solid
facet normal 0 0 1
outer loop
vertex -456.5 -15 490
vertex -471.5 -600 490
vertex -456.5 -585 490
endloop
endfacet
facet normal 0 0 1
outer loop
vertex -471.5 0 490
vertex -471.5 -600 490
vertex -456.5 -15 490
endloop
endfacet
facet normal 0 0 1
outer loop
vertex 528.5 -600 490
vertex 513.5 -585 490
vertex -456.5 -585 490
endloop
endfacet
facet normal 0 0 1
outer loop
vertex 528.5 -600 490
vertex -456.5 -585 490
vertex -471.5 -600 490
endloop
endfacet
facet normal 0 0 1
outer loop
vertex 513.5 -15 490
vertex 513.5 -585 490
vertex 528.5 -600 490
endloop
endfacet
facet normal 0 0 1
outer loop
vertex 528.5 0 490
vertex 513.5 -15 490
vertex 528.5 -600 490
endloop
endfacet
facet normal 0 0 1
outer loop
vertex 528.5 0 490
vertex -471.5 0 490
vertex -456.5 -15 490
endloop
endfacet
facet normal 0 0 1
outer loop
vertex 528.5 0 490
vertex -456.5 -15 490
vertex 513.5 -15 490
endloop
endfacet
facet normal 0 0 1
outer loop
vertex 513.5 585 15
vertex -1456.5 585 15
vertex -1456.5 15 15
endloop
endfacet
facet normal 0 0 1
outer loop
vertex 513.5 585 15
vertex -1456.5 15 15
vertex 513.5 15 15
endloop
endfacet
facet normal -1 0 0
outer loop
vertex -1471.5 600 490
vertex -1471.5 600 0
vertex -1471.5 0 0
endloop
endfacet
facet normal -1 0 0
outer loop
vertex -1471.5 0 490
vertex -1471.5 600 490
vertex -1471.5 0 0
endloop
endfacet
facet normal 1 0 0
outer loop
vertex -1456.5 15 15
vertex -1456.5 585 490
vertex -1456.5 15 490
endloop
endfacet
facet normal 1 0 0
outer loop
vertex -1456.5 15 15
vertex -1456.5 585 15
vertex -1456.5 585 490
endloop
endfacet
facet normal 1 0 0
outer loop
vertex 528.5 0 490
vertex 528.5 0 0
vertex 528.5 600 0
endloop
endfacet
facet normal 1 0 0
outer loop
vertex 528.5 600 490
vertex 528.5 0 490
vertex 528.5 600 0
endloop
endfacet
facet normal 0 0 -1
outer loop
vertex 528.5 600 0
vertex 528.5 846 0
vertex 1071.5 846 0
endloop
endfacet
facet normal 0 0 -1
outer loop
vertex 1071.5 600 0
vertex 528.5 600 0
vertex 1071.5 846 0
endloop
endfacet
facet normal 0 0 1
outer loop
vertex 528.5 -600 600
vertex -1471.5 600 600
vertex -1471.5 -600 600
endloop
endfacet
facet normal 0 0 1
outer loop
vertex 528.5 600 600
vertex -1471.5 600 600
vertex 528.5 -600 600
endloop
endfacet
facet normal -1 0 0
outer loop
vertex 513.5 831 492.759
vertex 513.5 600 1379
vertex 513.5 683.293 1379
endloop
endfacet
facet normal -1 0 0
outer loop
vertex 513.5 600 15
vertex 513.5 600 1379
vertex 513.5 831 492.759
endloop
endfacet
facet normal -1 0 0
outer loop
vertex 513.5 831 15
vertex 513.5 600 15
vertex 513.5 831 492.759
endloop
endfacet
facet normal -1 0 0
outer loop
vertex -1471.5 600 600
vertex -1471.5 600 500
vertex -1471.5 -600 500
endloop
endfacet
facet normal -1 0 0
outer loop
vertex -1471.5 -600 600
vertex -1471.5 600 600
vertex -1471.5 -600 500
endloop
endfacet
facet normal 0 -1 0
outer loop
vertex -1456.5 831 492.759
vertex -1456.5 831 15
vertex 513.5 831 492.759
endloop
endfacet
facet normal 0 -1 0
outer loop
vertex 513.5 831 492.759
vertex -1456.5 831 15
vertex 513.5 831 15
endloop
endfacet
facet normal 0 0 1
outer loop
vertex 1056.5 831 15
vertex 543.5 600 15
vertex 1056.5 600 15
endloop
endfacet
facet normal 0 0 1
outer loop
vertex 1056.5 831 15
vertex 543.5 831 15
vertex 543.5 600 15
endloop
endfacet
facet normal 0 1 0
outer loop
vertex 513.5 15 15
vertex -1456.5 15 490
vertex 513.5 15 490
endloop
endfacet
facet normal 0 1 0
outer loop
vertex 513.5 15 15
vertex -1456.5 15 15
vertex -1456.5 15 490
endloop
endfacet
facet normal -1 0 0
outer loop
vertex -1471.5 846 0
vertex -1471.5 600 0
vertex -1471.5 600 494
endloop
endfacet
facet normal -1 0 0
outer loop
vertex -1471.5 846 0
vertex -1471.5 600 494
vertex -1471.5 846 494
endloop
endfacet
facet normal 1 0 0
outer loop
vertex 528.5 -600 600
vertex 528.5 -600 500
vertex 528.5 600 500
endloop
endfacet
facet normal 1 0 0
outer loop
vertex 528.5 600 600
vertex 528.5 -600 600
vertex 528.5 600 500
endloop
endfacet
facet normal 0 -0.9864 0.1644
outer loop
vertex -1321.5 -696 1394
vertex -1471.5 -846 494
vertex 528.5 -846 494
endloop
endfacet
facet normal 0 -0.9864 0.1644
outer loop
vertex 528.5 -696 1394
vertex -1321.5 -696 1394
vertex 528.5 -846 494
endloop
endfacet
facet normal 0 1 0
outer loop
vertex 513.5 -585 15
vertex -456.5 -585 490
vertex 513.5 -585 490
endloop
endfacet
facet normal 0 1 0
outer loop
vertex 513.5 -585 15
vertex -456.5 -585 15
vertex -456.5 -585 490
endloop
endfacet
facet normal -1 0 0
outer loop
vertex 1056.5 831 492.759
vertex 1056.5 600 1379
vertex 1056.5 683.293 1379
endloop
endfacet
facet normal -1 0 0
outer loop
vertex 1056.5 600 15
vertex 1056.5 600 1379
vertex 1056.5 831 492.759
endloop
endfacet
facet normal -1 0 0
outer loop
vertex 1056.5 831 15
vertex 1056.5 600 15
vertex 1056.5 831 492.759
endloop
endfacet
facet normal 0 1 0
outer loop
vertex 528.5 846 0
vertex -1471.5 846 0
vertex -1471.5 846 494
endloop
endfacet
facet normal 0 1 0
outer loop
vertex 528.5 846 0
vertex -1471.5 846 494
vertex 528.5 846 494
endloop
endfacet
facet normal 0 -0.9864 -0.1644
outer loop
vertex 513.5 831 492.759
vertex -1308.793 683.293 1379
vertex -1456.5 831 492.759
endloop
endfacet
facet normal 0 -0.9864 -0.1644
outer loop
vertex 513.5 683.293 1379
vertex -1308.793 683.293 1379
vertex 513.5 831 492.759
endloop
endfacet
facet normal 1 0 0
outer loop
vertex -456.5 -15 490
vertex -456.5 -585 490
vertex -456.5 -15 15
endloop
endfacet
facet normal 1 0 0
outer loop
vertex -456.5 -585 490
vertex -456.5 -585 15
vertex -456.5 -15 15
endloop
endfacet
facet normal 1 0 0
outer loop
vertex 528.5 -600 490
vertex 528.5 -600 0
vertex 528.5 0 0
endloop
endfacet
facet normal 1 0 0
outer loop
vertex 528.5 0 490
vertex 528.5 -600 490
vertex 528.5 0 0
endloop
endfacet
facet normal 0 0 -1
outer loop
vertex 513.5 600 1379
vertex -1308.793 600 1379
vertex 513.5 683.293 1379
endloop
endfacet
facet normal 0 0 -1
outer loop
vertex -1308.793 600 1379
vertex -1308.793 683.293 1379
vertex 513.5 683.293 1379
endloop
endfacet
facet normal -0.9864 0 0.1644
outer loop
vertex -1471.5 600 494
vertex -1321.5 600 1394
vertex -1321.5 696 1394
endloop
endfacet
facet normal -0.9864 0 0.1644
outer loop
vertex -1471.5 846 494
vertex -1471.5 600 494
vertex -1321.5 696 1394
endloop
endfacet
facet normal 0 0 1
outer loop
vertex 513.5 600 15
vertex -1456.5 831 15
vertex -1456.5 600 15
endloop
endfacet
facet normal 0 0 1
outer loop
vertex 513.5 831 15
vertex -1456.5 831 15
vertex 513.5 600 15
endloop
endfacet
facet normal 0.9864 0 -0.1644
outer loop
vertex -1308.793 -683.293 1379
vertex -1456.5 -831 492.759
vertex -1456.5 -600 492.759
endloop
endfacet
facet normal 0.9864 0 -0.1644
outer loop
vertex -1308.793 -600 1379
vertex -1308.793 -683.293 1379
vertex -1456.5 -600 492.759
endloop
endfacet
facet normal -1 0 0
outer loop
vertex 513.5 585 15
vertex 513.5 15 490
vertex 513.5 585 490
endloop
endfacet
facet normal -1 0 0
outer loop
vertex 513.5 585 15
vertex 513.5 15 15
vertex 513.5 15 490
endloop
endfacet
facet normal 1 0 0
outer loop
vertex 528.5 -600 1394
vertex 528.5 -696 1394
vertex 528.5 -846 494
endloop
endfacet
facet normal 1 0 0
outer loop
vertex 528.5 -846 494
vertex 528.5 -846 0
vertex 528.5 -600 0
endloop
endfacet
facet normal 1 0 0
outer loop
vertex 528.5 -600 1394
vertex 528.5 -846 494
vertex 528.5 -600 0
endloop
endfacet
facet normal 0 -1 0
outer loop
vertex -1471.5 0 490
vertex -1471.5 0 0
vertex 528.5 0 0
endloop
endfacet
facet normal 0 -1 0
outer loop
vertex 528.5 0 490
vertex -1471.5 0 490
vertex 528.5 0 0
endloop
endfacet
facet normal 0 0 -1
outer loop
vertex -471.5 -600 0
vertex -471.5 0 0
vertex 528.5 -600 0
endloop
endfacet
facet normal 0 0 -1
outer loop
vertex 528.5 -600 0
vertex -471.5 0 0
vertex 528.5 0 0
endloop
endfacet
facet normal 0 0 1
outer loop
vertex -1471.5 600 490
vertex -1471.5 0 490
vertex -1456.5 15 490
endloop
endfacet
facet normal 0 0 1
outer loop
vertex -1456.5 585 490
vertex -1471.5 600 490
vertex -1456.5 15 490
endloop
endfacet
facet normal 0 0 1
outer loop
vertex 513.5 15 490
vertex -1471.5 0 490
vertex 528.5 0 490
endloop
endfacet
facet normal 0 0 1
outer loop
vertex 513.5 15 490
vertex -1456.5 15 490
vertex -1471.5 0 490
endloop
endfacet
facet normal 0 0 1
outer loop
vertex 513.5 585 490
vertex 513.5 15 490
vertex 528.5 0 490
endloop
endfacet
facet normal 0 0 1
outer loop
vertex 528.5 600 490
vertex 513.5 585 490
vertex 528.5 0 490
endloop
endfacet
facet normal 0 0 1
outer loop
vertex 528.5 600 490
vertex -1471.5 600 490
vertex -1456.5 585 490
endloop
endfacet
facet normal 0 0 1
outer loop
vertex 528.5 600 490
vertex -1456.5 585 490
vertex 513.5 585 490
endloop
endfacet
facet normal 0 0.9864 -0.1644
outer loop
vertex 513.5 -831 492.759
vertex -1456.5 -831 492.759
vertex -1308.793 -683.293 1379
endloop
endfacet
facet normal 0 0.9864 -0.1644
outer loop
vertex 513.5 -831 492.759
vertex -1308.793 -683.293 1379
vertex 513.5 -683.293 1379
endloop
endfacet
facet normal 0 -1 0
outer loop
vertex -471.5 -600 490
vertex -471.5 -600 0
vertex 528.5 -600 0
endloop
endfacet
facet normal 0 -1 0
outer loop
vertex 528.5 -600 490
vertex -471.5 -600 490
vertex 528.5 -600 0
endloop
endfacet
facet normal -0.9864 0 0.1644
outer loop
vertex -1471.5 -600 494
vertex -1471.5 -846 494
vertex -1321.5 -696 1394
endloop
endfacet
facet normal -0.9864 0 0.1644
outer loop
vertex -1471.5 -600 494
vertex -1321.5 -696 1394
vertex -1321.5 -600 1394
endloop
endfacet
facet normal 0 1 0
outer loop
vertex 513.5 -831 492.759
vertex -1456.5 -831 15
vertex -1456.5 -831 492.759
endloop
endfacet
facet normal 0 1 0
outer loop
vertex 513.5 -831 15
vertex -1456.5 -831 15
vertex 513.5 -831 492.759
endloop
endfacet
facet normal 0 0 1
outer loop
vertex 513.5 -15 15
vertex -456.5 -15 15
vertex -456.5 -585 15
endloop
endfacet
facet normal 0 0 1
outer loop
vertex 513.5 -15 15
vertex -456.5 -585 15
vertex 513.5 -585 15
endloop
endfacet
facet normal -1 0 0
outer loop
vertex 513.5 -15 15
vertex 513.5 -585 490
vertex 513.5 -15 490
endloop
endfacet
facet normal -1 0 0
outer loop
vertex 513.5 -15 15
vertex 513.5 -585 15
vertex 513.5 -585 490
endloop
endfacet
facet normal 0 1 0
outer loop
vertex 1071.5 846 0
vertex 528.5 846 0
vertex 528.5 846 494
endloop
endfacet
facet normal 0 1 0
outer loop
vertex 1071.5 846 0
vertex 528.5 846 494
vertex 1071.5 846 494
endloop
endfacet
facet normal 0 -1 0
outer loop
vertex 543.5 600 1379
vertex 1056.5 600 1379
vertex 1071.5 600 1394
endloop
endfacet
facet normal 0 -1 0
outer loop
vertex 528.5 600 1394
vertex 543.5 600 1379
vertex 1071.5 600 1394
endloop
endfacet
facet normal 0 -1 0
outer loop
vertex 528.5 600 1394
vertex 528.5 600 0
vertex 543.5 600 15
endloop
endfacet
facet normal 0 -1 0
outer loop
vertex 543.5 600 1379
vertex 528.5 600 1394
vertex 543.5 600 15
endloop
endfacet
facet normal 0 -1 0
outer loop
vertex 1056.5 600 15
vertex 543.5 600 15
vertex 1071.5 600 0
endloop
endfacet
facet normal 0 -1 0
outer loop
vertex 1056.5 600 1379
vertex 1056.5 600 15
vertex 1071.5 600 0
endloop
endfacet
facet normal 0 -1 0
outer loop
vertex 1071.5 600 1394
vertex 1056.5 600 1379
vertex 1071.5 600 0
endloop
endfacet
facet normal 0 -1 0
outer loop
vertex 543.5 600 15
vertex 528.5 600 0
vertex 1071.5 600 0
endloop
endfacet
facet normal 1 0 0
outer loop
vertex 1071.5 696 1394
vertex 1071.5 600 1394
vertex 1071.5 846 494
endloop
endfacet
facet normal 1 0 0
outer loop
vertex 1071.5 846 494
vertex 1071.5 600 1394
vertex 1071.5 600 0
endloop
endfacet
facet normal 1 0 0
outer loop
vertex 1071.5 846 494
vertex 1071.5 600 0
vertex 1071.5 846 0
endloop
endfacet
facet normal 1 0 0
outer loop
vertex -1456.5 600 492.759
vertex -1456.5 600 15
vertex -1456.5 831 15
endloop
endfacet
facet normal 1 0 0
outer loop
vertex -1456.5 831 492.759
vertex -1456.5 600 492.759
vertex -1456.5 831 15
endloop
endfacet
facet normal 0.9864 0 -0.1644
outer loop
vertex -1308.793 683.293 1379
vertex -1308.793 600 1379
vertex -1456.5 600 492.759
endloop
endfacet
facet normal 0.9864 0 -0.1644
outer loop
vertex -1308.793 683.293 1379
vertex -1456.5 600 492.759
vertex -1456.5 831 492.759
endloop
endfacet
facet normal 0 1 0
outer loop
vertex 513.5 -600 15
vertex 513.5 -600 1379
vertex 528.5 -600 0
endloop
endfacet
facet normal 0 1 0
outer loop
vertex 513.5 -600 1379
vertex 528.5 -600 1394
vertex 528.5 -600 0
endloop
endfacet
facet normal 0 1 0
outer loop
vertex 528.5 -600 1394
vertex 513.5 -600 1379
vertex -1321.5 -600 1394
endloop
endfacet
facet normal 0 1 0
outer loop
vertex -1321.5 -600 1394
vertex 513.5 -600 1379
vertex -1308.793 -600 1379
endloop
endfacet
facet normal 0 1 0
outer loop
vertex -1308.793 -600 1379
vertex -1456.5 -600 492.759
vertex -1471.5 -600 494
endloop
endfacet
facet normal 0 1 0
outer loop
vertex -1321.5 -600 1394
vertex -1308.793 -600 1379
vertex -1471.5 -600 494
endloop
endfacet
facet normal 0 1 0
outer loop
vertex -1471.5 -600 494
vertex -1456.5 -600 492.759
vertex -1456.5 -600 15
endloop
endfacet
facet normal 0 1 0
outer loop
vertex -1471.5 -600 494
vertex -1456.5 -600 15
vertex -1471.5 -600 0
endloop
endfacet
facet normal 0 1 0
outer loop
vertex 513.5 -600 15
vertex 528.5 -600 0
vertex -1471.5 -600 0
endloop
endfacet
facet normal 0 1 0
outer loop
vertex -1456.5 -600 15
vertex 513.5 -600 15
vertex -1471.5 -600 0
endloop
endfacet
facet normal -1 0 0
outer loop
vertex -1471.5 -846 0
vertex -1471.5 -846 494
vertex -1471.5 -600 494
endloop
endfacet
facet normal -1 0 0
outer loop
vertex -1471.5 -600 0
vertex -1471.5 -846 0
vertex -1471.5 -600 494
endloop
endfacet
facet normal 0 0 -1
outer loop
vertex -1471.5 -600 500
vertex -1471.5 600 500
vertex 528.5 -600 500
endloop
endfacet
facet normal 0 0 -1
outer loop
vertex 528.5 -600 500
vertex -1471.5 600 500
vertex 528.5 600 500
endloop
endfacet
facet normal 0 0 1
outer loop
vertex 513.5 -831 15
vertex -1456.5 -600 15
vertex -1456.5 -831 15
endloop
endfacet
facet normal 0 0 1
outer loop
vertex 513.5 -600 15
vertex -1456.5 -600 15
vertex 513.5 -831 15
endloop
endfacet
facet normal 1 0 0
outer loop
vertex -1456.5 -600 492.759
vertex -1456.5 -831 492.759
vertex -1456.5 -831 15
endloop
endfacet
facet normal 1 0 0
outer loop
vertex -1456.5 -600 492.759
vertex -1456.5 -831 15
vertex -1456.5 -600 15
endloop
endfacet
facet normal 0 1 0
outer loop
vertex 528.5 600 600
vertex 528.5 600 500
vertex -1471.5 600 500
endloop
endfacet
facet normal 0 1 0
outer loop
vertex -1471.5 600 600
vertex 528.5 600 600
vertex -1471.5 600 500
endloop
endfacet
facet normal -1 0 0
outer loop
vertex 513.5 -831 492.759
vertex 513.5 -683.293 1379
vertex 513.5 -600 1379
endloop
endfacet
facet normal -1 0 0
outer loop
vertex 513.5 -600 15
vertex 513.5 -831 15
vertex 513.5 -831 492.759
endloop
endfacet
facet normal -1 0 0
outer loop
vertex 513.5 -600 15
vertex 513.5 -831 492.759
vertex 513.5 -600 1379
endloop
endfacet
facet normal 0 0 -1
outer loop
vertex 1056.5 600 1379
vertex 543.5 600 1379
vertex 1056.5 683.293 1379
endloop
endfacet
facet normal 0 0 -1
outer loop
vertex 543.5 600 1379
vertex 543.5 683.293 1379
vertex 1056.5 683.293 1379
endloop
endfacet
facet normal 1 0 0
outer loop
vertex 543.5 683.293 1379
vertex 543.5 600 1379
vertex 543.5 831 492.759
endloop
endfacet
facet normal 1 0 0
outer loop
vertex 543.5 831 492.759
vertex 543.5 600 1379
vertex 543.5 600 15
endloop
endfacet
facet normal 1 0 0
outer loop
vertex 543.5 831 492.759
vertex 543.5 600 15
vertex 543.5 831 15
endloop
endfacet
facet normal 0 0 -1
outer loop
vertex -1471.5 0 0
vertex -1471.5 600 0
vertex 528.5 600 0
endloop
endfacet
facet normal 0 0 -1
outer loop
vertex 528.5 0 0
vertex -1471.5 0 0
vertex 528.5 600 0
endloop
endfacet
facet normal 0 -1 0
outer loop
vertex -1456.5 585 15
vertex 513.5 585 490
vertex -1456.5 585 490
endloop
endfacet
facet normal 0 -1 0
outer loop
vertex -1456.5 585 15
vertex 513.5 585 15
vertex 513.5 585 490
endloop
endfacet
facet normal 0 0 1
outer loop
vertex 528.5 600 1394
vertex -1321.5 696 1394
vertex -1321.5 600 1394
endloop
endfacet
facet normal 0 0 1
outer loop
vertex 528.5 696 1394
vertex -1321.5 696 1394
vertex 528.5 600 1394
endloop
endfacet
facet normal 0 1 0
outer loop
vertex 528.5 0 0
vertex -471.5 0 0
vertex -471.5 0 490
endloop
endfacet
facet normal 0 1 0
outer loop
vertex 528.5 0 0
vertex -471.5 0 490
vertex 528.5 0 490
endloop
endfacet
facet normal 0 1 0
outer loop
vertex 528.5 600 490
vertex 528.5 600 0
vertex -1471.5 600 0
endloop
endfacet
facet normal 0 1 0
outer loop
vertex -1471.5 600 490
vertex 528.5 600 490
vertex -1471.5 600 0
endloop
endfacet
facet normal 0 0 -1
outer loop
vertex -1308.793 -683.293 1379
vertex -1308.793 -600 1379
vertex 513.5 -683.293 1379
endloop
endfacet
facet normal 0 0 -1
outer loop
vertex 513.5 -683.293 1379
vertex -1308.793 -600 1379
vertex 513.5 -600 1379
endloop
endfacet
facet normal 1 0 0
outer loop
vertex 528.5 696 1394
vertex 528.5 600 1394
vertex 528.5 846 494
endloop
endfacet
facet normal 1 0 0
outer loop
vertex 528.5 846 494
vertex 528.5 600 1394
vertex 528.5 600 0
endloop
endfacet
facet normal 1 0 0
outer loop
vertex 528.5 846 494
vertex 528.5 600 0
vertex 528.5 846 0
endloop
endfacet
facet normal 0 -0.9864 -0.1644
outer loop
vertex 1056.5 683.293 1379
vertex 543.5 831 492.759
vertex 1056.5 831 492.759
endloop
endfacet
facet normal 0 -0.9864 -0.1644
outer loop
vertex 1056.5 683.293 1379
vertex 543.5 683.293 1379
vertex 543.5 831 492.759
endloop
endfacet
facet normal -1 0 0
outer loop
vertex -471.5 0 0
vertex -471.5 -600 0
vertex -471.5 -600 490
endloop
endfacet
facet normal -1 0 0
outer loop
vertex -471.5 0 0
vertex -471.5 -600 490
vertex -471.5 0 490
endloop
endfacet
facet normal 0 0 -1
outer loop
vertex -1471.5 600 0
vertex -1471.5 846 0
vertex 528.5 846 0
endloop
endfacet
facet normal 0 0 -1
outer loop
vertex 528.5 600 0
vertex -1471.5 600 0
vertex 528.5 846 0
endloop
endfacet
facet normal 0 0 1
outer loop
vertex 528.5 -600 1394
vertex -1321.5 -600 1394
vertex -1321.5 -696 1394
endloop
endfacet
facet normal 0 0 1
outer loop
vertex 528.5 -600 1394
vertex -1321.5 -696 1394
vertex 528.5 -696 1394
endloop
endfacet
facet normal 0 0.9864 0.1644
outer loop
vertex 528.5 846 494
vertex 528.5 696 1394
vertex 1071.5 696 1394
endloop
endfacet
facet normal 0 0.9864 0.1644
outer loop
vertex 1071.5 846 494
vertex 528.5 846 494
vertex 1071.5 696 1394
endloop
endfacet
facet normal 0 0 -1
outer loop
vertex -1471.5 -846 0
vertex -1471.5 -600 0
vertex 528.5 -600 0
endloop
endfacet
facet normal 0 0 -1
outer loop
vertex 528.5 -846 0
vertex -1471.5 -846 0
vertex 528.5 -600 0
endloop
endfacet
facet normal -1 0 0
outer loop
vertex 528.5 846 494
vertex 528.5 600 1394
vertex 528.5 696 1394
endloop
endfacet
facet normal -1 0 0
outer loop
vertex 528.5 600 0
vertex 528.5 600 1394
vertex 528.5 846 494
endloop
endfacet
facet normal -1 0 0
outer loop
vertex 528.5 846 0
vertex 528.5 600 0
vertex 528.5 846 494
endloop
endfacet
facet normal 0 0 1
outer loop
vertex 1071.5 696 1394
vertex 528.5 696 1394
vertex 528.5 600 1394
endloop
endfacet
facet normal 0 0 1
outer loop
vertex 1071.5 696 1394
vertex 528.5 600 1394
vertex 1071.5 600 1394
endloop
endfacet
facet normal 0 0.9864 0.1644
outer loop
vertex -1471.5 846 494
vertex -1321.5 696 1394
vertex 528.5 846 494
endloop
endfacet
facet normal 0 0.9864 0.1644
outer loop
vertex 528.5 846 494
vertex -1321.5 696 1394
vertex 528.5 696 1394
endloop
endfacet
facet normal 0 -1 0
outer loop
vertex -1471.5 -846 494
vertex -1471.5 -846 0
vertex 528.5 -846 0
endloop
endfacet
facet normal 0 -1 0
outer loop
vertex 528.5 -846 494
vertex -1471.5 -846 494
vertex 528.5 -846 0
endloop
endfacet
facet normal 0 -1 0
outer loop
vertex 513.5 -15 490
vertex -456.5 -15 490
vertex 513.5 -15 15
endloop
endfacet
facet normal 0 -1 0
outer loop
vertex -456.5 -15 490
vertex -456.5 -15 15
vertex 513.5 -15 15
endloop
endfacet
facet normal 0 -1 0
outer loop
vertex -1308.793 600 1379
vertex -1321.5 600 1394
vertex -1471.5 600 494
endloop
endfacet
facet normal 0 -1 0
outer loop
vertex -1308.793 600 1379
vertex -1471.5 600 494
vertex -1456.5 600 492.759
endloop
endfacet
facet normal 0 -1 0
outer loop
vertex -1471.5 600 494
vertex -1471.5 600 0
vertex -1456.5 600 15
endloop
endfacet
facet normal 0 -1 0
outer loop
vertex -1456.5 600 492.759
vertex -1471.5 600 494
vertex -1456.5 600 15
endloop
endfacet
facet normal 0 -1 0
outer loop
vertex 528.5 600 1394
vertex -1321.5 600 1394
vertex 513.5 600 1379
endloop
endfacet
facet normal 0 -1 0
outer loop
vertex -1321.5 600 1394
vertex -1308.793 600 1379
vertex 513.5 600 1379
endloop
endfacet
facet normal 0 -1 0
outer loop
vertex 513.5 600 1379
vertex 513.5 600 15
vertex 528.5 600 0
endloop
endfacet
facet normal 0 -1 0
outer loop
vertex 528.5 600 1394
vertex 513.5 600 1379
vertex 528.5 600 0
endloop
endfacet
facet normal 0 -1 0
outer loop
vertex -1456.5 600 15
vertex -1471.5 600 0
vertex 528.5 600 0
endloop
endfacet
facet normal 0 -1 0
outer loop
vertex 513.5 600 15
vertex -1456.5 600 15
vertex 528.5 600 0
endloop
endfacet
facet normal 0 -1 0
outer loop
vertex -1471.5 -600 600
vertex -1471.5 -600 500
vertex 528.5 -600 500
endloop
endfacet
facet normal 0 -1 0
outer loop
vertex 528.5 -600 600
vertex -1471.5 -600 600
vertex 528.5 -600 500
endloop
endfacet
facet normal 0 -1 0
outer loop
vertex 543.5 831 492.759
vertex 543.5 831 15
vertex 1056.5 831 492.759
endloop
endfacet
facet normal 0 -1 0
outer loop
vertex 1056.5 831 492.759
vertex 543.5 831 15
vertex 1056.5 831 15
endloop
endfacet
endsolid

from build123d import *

# Parameters (mm, degrees)
F2_W       = 1000
F2_H       = 600
F3_DEPTH   = 600
F2_W_2     = 2000
F2_H_2     = 246
F4_DEPTH   = 1394
F5_DEPTH   = 500
F2_W_3     = 543
F6_DEPTH   = 1394
F7_SIZE2   = 900
F7_SIZE    = 150
F8_SIZE2   = 150
F8_SIZE    = 900
F8_2_SIZE2 = 150
F8_2_SIZE  = 900
F9_DEPTH   = 490
F10_DEPTH  = 490
F11_T      = -15
F11_2_T    = -15
F11_3_T    = -15
F11_4_T    = -15
F11_5_T    = -15


with BuildPart() as f3:
    # F2 (on Top) → F3 (new body)
    with BuildSketch(Plane.XY):
        Polygon((528.5, 600), (-1471.5, 600), (-1471.5, 0), (-471.5, 0), (528.5, 0), align=None)
        with Locations((-971.5, -300)):
            Rectangle(F2_W, F2_H)
        with Locations((28.5, -300)):
            Rectangle(F2_W, F2_H)
    extrude(amount=F3_DEPTH)

    # F2 (on Top) → F5 (cut)
    with BuildSketch(Plane.XY):
        with Locations((-971.5, -300)):
            Rectangle(F2_W, F2_H)
        with Locations((28.5, -300)):
            Rectangle(F2_W, F2_H)
        Polygon((528.5, 600), (-1471.5, 600), (-1471.5, 0), (-471.5, 0), (528.5, 0), align=None)
    extrude(amount=F5_DEPTH, mode=Mode.SUBTRACT)


with BuildPart() as f4:
    # F2 (on Top) → F4 (new body)
    with BuildSketch(Plane.XY):
        with Locations((-471.5, 723)):
            Rectangle(F2_W_2, F2_H_2)
    extrude(amount=F4_DEPTH)

    # F8
    f8_edges = [f4.edges().sort_by_distance(p)[0] for p in [
        (-471.5, 846, 1394),
        (-1471.5, 723, 1394),
    ]]
    chamfer(f8_edges, length=F8_SIZE, length2=F8_SIZE2)

    # F11#4
    f11_4_openings = [f4.faces().sort_by_distance(p)[0] for p in [
        (-447.928965, 600, 687.149789),
    ]]
    offset(amount=F11_4_T, openings=f11_4_openings)


with BuildPart() as f4b:
    # F2 (on Top) → F4, piece 2 (new body)
    with BuildSketch(Plane.XY):
        with Locations((-971.5, -723)):
            Rectangle(F2_W, F2_H_2)
        with Locations((28.5, -723)):
            Rectangle(F2_W, F2_H_2)
    extrude(amount=F4_DEPTH)

    # F7
    f7_edges = [f4b.edges().sort_by_distance(p)[0] for p in [
        (-471.5, -846, 1394),
        (-1471.5, -723, 1394),
    ]]
    f7_side = f4b.faces().sort_by_distance((-471.5, -723, 1394))[0]
    chamfer(f7_edges, length=F7_SIZE, length2=F7_SIZE2, reference=f7_side)

    # F11#3
    f11_3_openings = [f4b.faces().sort_by_distance(p)[0] for p in [
        (-447.928965, -600, 687.149789),
    ]]
    offset(amount=F11_3_T, openings=f11_3_openings)


with BuildPart() as f6:
    # F2 (on Top) → F6 (new body)
    with BuildSketch(Plane.XY):
        with Locations((800, 723)):
            Rectangle(F2_W_3, F2_H_2)
    extrude(amount=F6_DEPTH)

    # F8#2
    f8_2_edges = [f6.edges().sort_by_distance(p)[0] for p in [
        (800, 846, 1394),
    ]]
    chamfer(f8_2_edges, length=F8_2_SIZE, length2=F8_2_SIZE2)

    # F11#5
    f11_5_openings = [f6.faces().sort_by_distance(p)[0] for p in [
        (800, 600, 697),
    ]]
    offset(amount=F11_5_T, openings=f11_5_openings)


with BuildPart() as f9:
    # F2 (on Top) → F9 (new body)
    with BuildSketch(Plane.XY):
        with Locations((28.5, -300)):
            Rectangle(F2_W, F2_H)
    extrude(amount=F9_DEPTH)

    # F11#2
    f11_2_openings = [f9.faces().sort_by_distance(p)[0] for p in [
        (28.5, -300, 490),
    ]]
    offset(amount=F11_2_T, openings=f11_2_openings)


with BuildPart() as f10:
    # F2 (on Top) → F10 (new body)
    with BuildSketch(Plane.XY):
        Polygon((528.5, 600), (-1471.5, 600), (-1471.5, 0), (-471.5, 0), (528.5, 0), align=None)
    extrude(amount=F10_DEPTH)

    # F11
    f11_openings = [f10.faces().sort_by_distance(p)[0] for p in [
        (-471.5, 300, 490),
    ]]
    offset(amount=F11_T, openings=f11_openings)


solid = Compound([f3.part, f4.part, f4b.part, f6.part, f9.part, f10.part])
